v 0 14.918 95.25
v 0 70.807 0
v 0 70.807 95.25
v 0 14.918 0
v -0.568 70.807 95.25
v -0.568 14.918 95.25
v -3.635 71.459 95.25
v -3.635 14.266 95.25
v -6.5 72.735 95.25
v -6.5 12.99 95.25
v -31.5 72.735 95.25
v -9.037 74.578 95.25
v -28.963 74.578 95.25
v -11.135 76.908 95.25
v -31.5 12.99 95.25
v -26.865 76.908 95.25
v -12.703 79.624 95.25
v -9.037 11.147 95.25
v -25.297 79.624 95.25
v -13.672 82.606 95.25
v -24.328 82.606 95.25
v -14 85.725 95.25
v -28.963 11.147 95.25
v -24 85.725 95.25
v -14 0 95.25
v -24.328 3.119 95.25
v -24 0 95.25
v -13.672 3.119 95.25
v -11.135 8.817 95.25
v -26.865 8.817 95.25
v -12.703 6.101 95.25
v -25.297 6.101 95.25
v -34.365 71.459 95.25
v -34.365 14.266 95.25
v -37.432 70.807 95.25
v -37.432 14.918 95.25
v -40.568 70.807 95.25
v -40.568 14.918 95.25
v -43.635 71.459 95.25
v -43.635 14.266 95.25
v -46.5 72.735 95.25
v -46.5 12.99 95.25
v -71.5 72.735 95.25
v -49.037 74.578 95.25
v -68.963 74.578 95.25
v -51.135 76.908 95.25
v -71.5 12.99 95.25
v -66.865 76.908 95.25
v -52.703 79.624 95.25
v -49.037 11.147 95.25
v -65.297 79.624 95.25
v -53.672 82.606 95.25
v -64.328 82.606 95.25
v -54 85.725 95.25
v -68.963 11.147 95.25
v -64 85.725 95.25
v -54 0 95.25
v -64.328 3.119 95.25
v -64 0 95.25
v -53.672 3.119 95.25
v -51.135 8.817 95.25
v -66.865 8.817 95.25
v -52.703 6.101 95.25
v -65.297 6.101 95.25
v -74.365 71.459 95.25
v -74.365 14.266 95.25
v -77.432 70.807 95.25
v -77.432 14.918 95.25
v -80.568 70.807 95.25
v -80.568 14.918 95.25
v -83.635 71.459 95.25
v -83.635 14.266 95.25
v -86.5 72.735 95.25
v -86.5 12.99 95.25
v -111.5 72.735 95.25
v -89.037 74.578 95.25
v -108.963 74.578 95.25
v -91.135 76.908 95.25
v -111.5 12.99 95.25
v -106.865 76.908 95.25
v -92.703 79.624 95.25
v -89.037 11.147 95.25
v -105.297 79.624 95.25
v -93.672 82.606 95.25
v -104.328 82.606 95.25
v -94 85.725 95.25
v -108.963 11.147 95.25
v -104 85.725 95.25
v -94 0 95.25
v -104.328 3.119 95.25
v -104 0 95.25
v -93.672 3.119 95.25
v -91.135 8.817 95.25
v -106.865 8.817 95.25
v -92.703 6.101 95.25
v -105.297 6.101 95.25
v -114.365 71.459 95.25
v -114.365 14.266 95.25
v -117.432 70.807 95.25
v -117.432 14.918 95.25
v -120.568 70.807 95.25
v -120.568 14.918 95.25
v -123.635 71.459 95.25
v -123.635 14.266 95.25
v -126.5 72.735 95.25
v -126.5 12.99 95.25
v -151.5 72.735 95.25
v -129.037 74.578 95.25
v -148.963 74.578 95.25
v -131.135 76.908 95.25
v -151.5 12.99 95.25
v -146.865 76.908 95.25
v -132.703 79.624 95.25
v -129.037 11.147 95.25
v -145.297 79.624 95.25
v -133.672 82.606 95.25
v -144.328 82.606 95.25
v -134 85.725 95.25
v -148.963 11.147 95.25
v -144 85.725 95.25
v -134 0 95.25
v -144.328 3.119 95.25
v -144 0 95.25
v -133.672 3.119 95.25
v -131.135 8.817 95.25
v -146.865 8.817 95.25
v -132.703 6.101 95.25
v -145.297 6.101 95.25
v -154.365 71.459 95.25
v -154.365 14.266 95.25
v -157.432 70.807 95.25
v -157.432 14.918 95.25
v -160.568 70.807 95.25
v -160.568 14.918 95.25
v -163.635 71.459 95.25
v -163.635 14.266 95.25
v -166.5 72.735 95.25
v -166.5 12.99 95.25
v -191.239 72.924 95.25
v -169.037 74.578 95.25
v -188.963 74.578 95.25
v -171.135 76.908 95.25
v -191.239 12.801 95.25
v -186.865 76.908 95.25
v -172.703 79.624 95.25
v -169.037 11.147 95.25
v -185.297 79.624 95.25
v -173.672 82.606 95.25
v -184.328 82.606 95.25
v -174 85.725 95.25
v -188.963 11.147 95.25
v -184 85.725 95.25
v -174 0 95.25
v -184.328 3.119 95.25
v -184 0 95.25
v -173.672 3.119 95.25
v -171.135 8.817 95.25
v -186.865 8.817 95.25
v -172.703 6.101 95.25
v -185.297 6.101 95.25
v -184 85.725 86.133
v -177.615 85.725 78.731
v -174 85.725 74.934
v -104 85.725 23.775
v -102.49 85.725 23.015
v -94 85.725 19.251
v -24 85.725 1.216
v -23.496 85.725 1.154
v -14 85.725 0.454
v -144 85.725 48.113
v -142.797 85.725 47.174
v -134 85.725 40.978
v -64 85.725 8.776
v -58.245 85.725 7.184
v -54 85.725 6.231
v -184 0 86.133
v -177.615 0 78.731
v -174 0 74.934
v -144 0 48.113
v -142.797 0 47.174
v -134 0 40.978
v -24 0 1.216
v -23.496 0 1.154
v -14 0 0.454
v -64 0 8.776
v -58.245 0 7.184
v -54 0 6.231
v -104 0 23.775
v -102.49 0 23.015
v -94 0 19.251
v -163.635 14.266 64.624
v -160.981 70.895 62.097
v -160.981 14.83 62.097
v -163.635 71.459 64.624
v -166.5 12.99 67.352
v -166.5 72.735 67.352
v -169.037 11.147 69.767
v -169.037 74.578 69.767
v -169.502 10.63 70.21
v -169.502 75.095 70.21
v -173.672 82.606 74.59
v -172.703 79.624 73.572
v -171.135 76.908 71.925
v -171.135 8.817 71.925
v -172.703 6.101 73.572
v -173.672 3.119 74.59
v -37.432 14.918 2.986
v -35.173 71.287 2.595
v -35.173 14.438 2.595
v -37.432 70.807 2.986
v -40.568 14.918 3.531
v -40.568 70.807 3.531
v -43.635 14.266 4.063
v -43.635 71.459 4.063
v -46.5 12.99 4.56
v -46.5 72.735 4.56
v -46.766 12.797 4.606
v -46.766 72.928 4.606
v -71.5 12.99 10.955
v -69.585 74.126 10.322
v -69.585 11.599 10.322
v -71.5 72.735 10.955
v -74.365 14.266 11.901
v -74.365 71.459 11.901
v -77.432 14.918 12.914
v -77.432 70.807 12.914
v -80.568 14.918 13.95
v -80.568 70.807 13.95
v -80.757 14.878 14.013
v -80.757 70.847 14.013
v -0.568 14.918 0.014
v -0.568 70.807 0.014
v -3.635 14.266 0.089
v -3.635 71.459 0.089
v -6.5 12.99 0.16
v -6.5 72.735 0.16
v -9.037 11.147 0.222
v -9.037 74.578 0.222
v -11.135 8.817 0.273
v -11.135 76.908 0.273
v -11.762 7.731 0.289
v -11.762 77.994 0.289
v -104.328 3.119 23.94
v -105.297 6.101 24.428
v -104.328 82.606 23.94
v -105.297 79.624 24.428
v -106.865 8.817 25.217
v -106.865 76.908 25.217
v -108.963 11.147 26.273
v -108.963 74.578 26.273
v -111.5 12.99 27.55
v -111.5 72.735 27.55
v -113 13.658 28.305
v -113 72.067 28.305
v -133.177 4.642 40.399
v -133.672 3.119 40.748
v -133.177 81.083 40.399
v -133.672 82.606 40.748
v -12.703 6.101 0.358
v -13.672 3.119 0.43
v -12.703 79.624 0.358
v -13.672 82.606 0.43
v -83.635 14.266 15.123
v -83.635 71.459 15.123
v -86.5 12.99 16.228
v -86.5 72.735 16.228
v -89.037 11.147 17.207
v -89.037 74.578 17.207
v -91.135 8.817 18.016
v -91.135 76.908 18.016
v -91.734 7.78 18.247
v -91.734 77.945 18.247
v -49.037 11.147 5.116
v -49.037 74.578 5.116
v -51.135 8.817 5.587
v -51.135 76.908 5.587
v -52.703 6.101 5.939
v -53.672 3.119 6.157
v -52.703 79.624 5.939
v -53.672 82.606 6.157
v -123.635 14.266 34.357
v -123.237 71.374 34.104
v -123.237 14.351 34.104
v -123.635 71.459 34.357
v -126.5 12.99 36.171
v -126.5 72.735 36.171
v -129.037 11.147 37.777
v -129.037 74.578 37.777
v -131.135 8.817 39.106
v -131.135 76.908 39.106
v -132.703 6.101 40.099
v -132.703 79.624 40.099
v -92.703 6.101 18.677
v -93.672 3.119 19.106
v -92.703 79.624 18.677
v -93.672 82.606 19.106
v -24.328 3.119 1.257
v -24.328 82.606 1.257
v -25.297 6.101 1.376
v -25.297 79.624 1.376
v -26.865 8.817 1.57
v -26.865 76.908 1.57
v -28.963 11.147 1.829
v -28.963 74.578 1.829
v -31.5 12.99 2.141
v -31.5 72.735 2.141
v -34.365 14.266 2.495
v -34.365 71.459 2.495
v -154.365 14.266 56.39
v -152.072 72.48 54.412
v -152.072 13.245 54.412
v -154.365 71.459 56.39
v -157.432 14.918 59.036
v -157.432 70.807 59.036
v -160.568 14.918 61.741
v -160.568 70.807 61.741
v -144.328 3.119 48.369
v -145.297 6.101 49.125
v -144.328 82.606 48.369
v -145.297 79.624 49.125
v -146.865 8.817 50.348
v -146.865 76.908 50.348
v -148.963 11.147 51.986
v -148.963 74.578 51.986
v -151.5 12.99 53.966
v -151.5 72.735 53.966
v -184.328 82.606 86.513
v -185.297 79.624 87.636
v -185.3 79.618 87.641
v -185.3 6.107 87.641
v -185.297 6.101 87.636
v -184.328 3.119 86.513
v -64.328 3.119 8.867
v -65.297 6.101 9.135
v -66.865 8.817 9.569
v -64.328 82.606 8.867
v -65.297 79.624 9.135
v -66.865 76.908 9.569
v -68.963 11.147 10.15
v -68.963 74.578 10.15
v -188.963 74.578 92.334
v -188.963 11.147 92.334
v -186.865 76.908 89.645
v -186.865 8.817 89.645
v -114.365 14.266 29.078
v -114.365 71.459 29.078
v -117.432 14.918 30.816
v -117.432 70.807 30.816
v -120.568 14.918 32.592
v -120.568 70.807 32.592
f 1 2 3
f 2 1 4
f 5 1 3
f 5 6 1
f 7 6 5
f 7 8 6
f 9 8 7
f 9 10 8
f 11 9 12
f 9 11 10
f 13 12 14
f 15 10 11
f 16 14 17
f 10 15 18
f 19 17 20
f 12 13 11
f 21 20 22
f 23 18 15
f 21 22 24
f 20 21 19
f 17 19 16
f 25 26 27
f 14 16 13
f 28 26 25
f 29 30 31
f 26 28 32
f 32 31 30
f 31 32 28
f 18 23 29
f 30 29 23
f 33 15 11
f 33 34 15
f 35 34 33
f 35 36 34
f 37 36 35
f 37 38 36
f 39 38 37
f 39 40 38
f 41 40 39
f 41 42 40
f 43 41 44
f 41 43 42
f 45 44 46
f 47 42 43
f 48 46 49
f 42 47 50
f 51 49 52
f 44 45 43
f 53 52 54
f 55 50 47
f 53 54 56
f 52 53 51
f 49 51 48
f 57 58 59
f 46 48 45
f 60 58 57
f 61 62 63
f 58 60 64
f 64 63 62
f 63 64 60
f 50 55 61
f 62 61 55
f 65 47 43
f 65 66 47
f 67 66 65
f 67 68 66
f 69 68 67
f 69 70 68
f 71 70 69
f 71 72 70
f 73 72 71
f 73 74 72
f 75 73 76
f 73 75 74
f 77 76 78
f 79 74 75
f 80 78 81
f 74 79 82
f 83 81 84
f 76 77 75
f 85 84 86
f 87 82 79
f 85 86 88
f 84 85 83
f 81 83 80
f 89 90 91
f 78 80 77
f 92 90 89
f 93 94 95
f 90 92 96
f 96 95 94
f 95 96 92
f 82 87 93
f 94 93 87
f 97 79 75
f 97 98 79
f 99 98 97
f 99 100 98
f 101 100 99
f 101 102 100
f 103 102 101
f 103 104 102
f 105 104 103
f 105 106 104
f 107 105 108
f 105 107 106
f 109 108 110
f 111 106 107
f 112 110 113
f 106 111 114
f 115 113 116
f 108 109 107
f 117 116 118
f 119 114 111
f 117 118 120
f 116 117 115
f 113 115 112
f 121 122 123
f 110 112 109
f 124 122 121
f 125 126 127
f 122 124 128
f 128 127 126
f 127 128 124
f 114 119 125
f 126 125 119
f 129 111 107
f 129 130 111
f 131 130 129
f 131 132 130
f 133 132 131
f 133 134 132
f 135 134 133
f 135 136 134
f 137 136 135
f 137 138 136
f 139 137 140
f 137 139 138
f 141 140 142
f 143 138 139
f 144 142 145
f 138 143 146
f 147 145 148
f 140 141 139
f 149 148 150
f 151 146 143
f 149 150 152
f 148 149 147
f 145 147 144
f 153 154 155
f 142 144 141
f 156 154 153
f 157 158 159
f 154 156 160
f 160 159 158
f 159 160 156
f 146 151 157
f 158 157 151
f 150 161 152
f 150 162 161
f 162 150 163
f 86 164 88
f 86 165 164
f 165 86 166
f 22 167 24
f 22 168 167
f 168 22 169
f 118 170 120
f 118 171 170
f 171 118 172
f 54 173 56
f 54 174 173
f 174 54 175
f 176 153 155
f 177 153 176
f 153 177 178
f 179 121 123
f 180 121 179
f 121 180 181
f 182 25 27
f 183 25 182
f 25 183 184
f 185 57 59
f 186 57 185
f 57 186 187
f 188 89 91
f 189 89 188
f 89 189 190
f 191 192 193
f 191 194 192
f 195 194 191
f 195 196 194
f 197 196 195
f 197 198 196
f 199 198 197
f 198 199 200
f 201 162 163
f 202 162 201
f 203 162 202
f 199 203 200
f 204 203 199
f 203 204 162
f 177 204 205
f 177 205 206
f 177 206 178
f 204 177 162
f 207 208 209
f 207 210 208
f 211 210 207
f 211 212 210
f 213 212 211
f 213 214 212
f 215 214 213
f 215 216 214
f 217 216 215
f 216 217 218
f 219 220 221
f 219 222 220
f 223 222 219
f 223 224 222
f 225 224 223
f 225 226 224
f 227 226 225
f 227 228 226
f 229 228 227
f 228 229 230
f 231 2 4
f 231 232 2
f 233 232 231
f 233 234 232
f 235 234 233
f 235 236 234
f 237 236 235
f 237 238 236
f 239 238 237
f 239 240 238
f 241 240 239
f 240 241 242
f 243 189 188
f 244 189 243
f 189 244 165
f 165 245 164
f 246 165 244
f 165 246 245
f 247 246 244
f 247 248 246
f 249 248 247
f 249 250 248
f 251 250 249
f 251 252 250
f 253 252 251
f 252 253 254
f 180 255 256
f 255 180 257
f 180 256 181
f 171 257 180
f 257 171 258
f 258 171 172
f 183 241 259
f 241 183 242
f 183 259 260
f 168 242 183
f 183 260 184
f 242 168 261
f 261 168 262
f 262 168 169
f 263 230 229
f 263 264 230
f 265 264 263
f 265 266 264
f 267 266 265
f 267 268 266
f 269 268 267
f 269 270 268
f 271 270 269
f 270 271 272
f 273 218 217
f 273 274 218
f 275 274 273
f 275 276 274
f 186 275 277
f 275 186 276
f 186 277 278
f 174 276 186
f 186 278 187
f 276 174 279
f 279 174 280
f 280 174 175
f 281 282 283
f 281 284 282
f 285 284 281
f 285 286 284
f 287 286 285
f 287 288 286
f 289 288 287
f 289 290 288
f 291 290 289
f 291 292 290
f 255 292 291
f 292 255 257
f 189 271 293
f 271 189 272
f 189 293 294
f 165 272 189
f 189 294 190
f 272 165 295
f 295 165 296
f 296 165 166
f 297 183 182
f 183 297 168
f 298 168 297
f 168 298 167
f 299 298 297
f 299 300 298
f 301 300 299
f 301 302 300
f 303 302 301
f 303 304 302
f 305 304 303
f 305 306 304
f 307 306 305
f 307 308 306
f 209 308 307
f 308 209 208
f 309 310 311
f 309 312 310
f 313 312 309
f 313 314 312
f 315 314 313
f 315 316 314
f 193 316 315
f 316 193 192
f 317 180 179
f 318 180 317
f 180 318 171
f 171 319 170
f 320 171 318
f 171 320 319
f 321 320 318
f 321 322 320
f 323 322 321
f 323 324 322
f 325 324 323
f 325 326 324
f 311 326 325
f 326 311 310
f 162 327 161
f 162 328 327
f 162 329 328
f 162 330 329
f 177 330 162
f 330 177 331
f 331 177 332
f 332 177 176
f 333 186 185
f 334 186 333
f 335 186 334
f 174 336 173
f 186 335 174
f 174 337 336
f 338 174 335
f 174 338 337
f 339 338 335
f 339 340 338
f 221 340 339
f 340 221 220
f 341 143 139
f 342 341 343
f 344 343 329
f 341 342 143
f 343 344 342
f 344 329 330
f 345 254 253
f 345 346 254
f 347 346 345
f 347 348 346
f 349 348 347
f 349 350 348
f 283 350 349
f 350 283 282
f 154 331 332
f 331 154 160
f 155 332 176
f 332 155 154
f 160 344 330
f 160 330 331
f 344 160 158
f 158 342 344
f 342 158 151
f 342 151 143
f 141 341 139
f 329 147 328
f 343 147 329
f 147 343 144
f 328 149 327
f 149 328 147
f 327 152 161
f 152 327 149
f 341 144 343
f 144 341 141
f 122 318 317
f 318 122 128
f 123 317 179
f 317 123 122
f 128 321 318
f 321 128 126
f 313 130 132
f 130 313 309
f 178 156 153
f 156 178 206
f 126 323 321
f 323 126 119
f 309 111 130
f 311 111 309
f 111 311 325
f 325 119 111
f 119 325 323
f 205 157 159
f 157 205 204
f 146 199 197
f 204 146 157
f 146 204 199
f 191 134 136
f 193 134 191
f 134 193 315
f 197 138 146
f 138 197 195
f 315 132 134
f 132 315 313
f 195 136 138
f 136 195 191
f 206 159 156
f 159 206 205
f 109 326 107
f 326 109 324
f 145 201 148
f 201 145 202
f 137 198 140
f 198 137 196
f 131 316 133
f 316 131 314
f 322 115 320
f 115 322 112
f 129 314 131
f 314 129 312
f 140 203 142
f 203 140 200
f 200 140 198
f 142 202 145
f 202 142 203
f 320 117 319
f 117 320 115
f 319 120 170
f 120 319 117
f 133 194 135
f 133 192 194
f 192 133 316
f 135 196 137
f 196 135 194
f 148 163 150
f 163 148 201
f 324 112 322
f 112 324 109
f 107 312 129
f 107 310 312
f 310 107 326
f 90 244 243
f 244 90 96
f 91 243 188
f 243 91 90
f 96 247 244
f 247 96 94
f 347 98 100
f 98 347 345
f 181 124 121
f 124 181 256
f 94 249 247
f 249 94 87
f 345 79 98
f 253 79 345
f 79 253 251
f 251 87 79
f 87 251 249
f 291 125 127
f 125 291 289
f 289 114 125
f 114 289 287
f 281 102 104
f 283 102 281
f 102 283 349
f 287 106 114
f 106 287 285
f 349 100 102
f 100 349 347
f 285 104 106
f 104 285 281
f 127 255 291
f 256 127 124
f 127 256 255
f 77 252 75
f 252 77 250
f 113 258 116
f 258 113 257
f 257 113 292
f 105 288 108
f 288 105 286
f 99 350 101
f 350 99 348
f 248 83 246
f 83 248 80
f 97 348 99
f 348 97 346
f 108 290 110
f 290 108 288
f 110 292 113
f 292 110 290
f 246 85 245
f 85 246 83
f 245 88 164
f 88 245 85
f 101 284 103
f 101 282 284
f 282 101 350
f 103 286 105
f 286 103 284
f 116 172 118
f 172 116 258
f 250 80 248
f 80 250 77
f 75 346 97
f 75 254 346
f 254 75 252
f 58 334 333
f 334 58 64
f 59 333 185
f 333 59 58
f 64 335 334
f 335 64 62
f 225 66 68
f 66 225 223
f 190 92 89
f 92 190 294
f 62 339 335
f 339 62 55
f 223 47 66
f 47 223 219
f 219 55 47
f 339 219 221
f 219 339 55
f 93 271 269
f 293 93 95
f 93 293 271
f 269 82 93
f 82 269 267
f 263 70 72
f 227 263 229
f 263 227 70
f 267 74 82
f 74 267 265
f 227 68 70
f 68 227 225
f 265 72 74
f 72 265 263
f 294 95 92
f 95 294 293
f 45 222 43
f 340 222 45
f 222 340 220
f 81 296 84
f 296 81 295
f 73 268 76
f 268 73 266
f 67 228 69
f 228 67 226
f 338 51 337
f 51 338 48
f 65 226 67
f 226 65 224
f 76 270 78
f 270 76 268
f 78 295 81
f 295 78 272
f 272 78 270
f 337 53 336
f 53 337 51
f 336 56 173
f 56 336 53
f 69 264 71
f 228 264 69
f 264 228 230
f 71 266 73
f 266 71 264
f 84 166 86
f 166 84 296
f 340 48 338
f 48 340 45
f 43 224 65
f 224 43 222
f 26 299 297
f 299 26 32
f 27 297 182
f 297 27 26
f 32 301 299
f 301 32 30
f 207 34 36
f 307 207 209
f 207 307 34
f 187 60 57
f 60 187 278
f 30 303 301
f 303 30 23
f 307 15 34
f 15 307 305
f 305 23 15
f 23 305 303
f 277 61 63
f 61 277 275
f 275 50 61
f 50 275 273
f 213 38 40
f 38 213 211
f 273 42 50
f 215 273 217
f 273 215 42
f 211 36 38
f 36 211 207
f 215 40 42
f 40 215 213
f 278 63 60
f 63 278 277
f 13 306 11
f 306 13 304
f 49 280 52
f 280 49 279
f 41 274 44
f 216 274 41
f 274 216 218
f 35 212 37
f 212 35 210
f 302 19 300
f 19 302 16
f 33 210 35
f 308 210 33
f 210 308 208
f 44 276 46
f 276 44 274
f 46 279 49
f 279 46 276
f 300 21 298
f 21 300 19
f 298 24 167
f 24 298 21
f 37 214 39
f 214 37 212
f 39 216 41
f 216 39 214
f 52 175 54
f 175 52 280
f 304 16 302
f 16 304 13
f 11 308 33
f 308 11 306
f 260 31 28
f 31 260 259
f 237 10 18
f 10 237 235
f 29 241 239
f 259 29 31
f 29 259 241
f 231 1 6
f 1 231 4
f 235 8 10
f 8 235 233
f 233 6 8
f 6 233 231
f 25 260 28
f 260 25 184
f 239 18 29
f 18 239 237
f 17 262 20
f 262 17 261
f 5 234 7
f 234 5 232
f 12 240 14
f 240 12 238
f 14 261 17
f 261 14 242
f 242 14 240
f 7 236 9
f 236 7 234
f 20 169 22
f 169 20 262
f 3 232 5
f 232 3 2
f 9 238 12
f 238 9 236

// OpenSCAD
union() {
	difference() {
		intersection() {
			translate(v = [-239.7125000000, 0, 0]) {
				cube(size = [239.7125000000, 85.7250000000, 95.2500000000]);
			}
			translate(v = [0, 0, 239.7125000000]) {
				rotate(a = -90, v = [1, 0, 0]) {
					cylinder($fn = 128, h = 85.7250000000, r = 239.7125000000);
				}
			}
		}
		translate(v = [-239, 0, 0]) {
			cylinder(h = 96.2500000000, r = 15);
		}
		translate(v = [-239, 85.7250000000, 0]) {
			cylinder(h = 96.2500000000, r = 15);
		}
		translate(v = [-199, 0, 0]) {
			cylinder(h = 96.2500000000, r = 15);
		}
		translate(v = [-199, 85.7250000000, 0]) {
			cylinder(h = 96.2500000000, r = 15);
		}
		translate(v = [-159, 0, 0]) {
			cylinder(h = 96.2500000000, r = 15);
		}
		translate(v = [-159, 85.7250000000, 0]) {
			cylinder(h = 96.2500000000, r = 15);
		}
		translate(v = [-119, 0, 0]) {
			cylinder(h = 96.2500000000, r = 15);
		}
		translate(v = [-119, 85.7250000000, 0]) {
			cylinder(h = 96.2500000000, r = 15);
		}
		translate(v = [-79, 0, 0]) {
			cylinder(h = 96.2500000000, r = 15);
		}
		translate(v = [-79, 85.7250000000, 0]) {
			cylinder(h = 96.2500000000, r = 15);
		}
		translate(v = [-39, 0, 0]) {
			cylinder(h = 96.2500000000, r = 15);
		}
		translate(v = [-39, 85.7250000000, 0]) {
			cylinder(h = 96.2500000000, r = 15);
		}
		translate(v = [1, 0, 0]) {
			cylinder(h = 96.2500000000, r = 15);
		}
		translate(v = [1, 85.7250000000, 0]) {
			cylinder(h = 96.2500000000, r = 15);
		}
	}
}
